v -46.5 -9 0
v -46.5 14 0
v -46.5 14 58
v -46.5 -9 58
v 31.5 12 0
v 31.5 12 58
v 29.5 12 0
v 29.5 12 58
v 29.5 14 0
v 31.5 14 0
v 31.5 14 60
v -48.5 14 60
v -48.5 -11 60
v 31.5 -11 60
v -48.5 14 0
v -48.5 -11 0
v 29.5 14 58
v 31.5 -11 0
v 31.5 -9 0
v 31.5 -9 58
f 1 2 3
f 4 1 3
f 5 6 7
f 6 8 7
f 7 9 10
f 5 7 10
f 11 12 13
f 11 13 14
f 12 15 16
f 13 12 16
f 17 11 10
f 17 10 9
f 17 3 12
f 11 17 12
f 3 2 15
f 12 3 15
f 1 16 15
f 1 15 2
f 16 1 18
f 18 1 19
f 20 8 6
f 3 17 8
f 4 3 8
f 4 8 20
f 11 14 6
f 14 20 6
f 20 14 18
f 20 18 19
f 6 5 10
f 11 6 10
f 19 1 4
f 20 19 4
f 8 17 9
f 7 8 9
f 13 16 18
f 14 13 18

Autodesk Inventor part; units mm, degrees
ref_plane "YZ Plane" through (0, 0, 0) normal (1, 0, 0) x (0, 1, 0)
ref_plane "XZ Plane" through (0, 0, 0) normal (0, 1, 0) x (-1, 0, 0)
sketch "Эскиз1" plane through (0, 0, 0) normal (0, 0, 1) x (1, 0, 0)
  line L0 (31.5, 14) -> (-48.5, 14)
  line L1 (-48.5, 14) -> (-48.5, -11)
  line L2 (-48.5, -11) -> (31.5, -11)
  line L3 (31.5, -11) -> (31.5, 14)
  line L4 (33.5, -8.5) -> (33.5, 11.5) projected
  point P0 (0, 0)
  point P1 (31.5, 1.5)
  point P2 (33.5, 1.5)
  dimension "d0" = 80
  dimension "d1" = 25
  dimension "d2" = 2
extrude "Выдавливание1" add sketch "Эскиз1" along normal blind 60
sketch "Эскиз2" plane through (-48.5, 14, 0) normal (0, 1, 0) x (1, 0, 0)
  line L0 (0, 0) -> (80, 0) projected
  line L1 (78, 0) -> (2, 0)
  line L2 (2, 0) -> (2, -58)
  line L3 (2, -58) -> (78, -58)
  line L4 (78, -58) -> (78, 0)
  line L5 (80, -60) -> (0, -60) projected
  line L6 (0, 0) -> (0, -60) projected
  line L7 (80, 0) -> (80, -60) projected
  point P0 (48.5, 0)
  dimension "d5" = 2
  dimension "d6" = 2
  dimension "d7" = 2
extrude "Выдавливание2" cut sketch "Эскиз2" against normal blind 23 contours L0 L4 L3 L2
sketch "Эскиз3" plane through (29.5, 14, 0) normal (-1, 0, 0) x (0, 0, 1)
  line L0 (58, 0) -> (58, -23) projected
  line L1 (0, -23) -> (58, -23) projected
  line L2 (58, -2) -> (0, -2)
  line L3 (0, -2) -> (0, -23)
  line L4 (0, -23) -> (58, -23)
  line L5 (58, -23) -> (58, -2)
  line L6 (0, 0) -> (58, 0) projected
  point P0 (0, -14)
  dimension "d10" = 2
ref_plane "РабПлоскость1" through (33.5, -8.5, 0) normal (-1, 0, 0) x (0, 0, 1)
extrude "Выдавливание3" cut sketch "Эскиз3" against normal up to surface (4 mm away)
properties part number "ДИ 00.00.07"
